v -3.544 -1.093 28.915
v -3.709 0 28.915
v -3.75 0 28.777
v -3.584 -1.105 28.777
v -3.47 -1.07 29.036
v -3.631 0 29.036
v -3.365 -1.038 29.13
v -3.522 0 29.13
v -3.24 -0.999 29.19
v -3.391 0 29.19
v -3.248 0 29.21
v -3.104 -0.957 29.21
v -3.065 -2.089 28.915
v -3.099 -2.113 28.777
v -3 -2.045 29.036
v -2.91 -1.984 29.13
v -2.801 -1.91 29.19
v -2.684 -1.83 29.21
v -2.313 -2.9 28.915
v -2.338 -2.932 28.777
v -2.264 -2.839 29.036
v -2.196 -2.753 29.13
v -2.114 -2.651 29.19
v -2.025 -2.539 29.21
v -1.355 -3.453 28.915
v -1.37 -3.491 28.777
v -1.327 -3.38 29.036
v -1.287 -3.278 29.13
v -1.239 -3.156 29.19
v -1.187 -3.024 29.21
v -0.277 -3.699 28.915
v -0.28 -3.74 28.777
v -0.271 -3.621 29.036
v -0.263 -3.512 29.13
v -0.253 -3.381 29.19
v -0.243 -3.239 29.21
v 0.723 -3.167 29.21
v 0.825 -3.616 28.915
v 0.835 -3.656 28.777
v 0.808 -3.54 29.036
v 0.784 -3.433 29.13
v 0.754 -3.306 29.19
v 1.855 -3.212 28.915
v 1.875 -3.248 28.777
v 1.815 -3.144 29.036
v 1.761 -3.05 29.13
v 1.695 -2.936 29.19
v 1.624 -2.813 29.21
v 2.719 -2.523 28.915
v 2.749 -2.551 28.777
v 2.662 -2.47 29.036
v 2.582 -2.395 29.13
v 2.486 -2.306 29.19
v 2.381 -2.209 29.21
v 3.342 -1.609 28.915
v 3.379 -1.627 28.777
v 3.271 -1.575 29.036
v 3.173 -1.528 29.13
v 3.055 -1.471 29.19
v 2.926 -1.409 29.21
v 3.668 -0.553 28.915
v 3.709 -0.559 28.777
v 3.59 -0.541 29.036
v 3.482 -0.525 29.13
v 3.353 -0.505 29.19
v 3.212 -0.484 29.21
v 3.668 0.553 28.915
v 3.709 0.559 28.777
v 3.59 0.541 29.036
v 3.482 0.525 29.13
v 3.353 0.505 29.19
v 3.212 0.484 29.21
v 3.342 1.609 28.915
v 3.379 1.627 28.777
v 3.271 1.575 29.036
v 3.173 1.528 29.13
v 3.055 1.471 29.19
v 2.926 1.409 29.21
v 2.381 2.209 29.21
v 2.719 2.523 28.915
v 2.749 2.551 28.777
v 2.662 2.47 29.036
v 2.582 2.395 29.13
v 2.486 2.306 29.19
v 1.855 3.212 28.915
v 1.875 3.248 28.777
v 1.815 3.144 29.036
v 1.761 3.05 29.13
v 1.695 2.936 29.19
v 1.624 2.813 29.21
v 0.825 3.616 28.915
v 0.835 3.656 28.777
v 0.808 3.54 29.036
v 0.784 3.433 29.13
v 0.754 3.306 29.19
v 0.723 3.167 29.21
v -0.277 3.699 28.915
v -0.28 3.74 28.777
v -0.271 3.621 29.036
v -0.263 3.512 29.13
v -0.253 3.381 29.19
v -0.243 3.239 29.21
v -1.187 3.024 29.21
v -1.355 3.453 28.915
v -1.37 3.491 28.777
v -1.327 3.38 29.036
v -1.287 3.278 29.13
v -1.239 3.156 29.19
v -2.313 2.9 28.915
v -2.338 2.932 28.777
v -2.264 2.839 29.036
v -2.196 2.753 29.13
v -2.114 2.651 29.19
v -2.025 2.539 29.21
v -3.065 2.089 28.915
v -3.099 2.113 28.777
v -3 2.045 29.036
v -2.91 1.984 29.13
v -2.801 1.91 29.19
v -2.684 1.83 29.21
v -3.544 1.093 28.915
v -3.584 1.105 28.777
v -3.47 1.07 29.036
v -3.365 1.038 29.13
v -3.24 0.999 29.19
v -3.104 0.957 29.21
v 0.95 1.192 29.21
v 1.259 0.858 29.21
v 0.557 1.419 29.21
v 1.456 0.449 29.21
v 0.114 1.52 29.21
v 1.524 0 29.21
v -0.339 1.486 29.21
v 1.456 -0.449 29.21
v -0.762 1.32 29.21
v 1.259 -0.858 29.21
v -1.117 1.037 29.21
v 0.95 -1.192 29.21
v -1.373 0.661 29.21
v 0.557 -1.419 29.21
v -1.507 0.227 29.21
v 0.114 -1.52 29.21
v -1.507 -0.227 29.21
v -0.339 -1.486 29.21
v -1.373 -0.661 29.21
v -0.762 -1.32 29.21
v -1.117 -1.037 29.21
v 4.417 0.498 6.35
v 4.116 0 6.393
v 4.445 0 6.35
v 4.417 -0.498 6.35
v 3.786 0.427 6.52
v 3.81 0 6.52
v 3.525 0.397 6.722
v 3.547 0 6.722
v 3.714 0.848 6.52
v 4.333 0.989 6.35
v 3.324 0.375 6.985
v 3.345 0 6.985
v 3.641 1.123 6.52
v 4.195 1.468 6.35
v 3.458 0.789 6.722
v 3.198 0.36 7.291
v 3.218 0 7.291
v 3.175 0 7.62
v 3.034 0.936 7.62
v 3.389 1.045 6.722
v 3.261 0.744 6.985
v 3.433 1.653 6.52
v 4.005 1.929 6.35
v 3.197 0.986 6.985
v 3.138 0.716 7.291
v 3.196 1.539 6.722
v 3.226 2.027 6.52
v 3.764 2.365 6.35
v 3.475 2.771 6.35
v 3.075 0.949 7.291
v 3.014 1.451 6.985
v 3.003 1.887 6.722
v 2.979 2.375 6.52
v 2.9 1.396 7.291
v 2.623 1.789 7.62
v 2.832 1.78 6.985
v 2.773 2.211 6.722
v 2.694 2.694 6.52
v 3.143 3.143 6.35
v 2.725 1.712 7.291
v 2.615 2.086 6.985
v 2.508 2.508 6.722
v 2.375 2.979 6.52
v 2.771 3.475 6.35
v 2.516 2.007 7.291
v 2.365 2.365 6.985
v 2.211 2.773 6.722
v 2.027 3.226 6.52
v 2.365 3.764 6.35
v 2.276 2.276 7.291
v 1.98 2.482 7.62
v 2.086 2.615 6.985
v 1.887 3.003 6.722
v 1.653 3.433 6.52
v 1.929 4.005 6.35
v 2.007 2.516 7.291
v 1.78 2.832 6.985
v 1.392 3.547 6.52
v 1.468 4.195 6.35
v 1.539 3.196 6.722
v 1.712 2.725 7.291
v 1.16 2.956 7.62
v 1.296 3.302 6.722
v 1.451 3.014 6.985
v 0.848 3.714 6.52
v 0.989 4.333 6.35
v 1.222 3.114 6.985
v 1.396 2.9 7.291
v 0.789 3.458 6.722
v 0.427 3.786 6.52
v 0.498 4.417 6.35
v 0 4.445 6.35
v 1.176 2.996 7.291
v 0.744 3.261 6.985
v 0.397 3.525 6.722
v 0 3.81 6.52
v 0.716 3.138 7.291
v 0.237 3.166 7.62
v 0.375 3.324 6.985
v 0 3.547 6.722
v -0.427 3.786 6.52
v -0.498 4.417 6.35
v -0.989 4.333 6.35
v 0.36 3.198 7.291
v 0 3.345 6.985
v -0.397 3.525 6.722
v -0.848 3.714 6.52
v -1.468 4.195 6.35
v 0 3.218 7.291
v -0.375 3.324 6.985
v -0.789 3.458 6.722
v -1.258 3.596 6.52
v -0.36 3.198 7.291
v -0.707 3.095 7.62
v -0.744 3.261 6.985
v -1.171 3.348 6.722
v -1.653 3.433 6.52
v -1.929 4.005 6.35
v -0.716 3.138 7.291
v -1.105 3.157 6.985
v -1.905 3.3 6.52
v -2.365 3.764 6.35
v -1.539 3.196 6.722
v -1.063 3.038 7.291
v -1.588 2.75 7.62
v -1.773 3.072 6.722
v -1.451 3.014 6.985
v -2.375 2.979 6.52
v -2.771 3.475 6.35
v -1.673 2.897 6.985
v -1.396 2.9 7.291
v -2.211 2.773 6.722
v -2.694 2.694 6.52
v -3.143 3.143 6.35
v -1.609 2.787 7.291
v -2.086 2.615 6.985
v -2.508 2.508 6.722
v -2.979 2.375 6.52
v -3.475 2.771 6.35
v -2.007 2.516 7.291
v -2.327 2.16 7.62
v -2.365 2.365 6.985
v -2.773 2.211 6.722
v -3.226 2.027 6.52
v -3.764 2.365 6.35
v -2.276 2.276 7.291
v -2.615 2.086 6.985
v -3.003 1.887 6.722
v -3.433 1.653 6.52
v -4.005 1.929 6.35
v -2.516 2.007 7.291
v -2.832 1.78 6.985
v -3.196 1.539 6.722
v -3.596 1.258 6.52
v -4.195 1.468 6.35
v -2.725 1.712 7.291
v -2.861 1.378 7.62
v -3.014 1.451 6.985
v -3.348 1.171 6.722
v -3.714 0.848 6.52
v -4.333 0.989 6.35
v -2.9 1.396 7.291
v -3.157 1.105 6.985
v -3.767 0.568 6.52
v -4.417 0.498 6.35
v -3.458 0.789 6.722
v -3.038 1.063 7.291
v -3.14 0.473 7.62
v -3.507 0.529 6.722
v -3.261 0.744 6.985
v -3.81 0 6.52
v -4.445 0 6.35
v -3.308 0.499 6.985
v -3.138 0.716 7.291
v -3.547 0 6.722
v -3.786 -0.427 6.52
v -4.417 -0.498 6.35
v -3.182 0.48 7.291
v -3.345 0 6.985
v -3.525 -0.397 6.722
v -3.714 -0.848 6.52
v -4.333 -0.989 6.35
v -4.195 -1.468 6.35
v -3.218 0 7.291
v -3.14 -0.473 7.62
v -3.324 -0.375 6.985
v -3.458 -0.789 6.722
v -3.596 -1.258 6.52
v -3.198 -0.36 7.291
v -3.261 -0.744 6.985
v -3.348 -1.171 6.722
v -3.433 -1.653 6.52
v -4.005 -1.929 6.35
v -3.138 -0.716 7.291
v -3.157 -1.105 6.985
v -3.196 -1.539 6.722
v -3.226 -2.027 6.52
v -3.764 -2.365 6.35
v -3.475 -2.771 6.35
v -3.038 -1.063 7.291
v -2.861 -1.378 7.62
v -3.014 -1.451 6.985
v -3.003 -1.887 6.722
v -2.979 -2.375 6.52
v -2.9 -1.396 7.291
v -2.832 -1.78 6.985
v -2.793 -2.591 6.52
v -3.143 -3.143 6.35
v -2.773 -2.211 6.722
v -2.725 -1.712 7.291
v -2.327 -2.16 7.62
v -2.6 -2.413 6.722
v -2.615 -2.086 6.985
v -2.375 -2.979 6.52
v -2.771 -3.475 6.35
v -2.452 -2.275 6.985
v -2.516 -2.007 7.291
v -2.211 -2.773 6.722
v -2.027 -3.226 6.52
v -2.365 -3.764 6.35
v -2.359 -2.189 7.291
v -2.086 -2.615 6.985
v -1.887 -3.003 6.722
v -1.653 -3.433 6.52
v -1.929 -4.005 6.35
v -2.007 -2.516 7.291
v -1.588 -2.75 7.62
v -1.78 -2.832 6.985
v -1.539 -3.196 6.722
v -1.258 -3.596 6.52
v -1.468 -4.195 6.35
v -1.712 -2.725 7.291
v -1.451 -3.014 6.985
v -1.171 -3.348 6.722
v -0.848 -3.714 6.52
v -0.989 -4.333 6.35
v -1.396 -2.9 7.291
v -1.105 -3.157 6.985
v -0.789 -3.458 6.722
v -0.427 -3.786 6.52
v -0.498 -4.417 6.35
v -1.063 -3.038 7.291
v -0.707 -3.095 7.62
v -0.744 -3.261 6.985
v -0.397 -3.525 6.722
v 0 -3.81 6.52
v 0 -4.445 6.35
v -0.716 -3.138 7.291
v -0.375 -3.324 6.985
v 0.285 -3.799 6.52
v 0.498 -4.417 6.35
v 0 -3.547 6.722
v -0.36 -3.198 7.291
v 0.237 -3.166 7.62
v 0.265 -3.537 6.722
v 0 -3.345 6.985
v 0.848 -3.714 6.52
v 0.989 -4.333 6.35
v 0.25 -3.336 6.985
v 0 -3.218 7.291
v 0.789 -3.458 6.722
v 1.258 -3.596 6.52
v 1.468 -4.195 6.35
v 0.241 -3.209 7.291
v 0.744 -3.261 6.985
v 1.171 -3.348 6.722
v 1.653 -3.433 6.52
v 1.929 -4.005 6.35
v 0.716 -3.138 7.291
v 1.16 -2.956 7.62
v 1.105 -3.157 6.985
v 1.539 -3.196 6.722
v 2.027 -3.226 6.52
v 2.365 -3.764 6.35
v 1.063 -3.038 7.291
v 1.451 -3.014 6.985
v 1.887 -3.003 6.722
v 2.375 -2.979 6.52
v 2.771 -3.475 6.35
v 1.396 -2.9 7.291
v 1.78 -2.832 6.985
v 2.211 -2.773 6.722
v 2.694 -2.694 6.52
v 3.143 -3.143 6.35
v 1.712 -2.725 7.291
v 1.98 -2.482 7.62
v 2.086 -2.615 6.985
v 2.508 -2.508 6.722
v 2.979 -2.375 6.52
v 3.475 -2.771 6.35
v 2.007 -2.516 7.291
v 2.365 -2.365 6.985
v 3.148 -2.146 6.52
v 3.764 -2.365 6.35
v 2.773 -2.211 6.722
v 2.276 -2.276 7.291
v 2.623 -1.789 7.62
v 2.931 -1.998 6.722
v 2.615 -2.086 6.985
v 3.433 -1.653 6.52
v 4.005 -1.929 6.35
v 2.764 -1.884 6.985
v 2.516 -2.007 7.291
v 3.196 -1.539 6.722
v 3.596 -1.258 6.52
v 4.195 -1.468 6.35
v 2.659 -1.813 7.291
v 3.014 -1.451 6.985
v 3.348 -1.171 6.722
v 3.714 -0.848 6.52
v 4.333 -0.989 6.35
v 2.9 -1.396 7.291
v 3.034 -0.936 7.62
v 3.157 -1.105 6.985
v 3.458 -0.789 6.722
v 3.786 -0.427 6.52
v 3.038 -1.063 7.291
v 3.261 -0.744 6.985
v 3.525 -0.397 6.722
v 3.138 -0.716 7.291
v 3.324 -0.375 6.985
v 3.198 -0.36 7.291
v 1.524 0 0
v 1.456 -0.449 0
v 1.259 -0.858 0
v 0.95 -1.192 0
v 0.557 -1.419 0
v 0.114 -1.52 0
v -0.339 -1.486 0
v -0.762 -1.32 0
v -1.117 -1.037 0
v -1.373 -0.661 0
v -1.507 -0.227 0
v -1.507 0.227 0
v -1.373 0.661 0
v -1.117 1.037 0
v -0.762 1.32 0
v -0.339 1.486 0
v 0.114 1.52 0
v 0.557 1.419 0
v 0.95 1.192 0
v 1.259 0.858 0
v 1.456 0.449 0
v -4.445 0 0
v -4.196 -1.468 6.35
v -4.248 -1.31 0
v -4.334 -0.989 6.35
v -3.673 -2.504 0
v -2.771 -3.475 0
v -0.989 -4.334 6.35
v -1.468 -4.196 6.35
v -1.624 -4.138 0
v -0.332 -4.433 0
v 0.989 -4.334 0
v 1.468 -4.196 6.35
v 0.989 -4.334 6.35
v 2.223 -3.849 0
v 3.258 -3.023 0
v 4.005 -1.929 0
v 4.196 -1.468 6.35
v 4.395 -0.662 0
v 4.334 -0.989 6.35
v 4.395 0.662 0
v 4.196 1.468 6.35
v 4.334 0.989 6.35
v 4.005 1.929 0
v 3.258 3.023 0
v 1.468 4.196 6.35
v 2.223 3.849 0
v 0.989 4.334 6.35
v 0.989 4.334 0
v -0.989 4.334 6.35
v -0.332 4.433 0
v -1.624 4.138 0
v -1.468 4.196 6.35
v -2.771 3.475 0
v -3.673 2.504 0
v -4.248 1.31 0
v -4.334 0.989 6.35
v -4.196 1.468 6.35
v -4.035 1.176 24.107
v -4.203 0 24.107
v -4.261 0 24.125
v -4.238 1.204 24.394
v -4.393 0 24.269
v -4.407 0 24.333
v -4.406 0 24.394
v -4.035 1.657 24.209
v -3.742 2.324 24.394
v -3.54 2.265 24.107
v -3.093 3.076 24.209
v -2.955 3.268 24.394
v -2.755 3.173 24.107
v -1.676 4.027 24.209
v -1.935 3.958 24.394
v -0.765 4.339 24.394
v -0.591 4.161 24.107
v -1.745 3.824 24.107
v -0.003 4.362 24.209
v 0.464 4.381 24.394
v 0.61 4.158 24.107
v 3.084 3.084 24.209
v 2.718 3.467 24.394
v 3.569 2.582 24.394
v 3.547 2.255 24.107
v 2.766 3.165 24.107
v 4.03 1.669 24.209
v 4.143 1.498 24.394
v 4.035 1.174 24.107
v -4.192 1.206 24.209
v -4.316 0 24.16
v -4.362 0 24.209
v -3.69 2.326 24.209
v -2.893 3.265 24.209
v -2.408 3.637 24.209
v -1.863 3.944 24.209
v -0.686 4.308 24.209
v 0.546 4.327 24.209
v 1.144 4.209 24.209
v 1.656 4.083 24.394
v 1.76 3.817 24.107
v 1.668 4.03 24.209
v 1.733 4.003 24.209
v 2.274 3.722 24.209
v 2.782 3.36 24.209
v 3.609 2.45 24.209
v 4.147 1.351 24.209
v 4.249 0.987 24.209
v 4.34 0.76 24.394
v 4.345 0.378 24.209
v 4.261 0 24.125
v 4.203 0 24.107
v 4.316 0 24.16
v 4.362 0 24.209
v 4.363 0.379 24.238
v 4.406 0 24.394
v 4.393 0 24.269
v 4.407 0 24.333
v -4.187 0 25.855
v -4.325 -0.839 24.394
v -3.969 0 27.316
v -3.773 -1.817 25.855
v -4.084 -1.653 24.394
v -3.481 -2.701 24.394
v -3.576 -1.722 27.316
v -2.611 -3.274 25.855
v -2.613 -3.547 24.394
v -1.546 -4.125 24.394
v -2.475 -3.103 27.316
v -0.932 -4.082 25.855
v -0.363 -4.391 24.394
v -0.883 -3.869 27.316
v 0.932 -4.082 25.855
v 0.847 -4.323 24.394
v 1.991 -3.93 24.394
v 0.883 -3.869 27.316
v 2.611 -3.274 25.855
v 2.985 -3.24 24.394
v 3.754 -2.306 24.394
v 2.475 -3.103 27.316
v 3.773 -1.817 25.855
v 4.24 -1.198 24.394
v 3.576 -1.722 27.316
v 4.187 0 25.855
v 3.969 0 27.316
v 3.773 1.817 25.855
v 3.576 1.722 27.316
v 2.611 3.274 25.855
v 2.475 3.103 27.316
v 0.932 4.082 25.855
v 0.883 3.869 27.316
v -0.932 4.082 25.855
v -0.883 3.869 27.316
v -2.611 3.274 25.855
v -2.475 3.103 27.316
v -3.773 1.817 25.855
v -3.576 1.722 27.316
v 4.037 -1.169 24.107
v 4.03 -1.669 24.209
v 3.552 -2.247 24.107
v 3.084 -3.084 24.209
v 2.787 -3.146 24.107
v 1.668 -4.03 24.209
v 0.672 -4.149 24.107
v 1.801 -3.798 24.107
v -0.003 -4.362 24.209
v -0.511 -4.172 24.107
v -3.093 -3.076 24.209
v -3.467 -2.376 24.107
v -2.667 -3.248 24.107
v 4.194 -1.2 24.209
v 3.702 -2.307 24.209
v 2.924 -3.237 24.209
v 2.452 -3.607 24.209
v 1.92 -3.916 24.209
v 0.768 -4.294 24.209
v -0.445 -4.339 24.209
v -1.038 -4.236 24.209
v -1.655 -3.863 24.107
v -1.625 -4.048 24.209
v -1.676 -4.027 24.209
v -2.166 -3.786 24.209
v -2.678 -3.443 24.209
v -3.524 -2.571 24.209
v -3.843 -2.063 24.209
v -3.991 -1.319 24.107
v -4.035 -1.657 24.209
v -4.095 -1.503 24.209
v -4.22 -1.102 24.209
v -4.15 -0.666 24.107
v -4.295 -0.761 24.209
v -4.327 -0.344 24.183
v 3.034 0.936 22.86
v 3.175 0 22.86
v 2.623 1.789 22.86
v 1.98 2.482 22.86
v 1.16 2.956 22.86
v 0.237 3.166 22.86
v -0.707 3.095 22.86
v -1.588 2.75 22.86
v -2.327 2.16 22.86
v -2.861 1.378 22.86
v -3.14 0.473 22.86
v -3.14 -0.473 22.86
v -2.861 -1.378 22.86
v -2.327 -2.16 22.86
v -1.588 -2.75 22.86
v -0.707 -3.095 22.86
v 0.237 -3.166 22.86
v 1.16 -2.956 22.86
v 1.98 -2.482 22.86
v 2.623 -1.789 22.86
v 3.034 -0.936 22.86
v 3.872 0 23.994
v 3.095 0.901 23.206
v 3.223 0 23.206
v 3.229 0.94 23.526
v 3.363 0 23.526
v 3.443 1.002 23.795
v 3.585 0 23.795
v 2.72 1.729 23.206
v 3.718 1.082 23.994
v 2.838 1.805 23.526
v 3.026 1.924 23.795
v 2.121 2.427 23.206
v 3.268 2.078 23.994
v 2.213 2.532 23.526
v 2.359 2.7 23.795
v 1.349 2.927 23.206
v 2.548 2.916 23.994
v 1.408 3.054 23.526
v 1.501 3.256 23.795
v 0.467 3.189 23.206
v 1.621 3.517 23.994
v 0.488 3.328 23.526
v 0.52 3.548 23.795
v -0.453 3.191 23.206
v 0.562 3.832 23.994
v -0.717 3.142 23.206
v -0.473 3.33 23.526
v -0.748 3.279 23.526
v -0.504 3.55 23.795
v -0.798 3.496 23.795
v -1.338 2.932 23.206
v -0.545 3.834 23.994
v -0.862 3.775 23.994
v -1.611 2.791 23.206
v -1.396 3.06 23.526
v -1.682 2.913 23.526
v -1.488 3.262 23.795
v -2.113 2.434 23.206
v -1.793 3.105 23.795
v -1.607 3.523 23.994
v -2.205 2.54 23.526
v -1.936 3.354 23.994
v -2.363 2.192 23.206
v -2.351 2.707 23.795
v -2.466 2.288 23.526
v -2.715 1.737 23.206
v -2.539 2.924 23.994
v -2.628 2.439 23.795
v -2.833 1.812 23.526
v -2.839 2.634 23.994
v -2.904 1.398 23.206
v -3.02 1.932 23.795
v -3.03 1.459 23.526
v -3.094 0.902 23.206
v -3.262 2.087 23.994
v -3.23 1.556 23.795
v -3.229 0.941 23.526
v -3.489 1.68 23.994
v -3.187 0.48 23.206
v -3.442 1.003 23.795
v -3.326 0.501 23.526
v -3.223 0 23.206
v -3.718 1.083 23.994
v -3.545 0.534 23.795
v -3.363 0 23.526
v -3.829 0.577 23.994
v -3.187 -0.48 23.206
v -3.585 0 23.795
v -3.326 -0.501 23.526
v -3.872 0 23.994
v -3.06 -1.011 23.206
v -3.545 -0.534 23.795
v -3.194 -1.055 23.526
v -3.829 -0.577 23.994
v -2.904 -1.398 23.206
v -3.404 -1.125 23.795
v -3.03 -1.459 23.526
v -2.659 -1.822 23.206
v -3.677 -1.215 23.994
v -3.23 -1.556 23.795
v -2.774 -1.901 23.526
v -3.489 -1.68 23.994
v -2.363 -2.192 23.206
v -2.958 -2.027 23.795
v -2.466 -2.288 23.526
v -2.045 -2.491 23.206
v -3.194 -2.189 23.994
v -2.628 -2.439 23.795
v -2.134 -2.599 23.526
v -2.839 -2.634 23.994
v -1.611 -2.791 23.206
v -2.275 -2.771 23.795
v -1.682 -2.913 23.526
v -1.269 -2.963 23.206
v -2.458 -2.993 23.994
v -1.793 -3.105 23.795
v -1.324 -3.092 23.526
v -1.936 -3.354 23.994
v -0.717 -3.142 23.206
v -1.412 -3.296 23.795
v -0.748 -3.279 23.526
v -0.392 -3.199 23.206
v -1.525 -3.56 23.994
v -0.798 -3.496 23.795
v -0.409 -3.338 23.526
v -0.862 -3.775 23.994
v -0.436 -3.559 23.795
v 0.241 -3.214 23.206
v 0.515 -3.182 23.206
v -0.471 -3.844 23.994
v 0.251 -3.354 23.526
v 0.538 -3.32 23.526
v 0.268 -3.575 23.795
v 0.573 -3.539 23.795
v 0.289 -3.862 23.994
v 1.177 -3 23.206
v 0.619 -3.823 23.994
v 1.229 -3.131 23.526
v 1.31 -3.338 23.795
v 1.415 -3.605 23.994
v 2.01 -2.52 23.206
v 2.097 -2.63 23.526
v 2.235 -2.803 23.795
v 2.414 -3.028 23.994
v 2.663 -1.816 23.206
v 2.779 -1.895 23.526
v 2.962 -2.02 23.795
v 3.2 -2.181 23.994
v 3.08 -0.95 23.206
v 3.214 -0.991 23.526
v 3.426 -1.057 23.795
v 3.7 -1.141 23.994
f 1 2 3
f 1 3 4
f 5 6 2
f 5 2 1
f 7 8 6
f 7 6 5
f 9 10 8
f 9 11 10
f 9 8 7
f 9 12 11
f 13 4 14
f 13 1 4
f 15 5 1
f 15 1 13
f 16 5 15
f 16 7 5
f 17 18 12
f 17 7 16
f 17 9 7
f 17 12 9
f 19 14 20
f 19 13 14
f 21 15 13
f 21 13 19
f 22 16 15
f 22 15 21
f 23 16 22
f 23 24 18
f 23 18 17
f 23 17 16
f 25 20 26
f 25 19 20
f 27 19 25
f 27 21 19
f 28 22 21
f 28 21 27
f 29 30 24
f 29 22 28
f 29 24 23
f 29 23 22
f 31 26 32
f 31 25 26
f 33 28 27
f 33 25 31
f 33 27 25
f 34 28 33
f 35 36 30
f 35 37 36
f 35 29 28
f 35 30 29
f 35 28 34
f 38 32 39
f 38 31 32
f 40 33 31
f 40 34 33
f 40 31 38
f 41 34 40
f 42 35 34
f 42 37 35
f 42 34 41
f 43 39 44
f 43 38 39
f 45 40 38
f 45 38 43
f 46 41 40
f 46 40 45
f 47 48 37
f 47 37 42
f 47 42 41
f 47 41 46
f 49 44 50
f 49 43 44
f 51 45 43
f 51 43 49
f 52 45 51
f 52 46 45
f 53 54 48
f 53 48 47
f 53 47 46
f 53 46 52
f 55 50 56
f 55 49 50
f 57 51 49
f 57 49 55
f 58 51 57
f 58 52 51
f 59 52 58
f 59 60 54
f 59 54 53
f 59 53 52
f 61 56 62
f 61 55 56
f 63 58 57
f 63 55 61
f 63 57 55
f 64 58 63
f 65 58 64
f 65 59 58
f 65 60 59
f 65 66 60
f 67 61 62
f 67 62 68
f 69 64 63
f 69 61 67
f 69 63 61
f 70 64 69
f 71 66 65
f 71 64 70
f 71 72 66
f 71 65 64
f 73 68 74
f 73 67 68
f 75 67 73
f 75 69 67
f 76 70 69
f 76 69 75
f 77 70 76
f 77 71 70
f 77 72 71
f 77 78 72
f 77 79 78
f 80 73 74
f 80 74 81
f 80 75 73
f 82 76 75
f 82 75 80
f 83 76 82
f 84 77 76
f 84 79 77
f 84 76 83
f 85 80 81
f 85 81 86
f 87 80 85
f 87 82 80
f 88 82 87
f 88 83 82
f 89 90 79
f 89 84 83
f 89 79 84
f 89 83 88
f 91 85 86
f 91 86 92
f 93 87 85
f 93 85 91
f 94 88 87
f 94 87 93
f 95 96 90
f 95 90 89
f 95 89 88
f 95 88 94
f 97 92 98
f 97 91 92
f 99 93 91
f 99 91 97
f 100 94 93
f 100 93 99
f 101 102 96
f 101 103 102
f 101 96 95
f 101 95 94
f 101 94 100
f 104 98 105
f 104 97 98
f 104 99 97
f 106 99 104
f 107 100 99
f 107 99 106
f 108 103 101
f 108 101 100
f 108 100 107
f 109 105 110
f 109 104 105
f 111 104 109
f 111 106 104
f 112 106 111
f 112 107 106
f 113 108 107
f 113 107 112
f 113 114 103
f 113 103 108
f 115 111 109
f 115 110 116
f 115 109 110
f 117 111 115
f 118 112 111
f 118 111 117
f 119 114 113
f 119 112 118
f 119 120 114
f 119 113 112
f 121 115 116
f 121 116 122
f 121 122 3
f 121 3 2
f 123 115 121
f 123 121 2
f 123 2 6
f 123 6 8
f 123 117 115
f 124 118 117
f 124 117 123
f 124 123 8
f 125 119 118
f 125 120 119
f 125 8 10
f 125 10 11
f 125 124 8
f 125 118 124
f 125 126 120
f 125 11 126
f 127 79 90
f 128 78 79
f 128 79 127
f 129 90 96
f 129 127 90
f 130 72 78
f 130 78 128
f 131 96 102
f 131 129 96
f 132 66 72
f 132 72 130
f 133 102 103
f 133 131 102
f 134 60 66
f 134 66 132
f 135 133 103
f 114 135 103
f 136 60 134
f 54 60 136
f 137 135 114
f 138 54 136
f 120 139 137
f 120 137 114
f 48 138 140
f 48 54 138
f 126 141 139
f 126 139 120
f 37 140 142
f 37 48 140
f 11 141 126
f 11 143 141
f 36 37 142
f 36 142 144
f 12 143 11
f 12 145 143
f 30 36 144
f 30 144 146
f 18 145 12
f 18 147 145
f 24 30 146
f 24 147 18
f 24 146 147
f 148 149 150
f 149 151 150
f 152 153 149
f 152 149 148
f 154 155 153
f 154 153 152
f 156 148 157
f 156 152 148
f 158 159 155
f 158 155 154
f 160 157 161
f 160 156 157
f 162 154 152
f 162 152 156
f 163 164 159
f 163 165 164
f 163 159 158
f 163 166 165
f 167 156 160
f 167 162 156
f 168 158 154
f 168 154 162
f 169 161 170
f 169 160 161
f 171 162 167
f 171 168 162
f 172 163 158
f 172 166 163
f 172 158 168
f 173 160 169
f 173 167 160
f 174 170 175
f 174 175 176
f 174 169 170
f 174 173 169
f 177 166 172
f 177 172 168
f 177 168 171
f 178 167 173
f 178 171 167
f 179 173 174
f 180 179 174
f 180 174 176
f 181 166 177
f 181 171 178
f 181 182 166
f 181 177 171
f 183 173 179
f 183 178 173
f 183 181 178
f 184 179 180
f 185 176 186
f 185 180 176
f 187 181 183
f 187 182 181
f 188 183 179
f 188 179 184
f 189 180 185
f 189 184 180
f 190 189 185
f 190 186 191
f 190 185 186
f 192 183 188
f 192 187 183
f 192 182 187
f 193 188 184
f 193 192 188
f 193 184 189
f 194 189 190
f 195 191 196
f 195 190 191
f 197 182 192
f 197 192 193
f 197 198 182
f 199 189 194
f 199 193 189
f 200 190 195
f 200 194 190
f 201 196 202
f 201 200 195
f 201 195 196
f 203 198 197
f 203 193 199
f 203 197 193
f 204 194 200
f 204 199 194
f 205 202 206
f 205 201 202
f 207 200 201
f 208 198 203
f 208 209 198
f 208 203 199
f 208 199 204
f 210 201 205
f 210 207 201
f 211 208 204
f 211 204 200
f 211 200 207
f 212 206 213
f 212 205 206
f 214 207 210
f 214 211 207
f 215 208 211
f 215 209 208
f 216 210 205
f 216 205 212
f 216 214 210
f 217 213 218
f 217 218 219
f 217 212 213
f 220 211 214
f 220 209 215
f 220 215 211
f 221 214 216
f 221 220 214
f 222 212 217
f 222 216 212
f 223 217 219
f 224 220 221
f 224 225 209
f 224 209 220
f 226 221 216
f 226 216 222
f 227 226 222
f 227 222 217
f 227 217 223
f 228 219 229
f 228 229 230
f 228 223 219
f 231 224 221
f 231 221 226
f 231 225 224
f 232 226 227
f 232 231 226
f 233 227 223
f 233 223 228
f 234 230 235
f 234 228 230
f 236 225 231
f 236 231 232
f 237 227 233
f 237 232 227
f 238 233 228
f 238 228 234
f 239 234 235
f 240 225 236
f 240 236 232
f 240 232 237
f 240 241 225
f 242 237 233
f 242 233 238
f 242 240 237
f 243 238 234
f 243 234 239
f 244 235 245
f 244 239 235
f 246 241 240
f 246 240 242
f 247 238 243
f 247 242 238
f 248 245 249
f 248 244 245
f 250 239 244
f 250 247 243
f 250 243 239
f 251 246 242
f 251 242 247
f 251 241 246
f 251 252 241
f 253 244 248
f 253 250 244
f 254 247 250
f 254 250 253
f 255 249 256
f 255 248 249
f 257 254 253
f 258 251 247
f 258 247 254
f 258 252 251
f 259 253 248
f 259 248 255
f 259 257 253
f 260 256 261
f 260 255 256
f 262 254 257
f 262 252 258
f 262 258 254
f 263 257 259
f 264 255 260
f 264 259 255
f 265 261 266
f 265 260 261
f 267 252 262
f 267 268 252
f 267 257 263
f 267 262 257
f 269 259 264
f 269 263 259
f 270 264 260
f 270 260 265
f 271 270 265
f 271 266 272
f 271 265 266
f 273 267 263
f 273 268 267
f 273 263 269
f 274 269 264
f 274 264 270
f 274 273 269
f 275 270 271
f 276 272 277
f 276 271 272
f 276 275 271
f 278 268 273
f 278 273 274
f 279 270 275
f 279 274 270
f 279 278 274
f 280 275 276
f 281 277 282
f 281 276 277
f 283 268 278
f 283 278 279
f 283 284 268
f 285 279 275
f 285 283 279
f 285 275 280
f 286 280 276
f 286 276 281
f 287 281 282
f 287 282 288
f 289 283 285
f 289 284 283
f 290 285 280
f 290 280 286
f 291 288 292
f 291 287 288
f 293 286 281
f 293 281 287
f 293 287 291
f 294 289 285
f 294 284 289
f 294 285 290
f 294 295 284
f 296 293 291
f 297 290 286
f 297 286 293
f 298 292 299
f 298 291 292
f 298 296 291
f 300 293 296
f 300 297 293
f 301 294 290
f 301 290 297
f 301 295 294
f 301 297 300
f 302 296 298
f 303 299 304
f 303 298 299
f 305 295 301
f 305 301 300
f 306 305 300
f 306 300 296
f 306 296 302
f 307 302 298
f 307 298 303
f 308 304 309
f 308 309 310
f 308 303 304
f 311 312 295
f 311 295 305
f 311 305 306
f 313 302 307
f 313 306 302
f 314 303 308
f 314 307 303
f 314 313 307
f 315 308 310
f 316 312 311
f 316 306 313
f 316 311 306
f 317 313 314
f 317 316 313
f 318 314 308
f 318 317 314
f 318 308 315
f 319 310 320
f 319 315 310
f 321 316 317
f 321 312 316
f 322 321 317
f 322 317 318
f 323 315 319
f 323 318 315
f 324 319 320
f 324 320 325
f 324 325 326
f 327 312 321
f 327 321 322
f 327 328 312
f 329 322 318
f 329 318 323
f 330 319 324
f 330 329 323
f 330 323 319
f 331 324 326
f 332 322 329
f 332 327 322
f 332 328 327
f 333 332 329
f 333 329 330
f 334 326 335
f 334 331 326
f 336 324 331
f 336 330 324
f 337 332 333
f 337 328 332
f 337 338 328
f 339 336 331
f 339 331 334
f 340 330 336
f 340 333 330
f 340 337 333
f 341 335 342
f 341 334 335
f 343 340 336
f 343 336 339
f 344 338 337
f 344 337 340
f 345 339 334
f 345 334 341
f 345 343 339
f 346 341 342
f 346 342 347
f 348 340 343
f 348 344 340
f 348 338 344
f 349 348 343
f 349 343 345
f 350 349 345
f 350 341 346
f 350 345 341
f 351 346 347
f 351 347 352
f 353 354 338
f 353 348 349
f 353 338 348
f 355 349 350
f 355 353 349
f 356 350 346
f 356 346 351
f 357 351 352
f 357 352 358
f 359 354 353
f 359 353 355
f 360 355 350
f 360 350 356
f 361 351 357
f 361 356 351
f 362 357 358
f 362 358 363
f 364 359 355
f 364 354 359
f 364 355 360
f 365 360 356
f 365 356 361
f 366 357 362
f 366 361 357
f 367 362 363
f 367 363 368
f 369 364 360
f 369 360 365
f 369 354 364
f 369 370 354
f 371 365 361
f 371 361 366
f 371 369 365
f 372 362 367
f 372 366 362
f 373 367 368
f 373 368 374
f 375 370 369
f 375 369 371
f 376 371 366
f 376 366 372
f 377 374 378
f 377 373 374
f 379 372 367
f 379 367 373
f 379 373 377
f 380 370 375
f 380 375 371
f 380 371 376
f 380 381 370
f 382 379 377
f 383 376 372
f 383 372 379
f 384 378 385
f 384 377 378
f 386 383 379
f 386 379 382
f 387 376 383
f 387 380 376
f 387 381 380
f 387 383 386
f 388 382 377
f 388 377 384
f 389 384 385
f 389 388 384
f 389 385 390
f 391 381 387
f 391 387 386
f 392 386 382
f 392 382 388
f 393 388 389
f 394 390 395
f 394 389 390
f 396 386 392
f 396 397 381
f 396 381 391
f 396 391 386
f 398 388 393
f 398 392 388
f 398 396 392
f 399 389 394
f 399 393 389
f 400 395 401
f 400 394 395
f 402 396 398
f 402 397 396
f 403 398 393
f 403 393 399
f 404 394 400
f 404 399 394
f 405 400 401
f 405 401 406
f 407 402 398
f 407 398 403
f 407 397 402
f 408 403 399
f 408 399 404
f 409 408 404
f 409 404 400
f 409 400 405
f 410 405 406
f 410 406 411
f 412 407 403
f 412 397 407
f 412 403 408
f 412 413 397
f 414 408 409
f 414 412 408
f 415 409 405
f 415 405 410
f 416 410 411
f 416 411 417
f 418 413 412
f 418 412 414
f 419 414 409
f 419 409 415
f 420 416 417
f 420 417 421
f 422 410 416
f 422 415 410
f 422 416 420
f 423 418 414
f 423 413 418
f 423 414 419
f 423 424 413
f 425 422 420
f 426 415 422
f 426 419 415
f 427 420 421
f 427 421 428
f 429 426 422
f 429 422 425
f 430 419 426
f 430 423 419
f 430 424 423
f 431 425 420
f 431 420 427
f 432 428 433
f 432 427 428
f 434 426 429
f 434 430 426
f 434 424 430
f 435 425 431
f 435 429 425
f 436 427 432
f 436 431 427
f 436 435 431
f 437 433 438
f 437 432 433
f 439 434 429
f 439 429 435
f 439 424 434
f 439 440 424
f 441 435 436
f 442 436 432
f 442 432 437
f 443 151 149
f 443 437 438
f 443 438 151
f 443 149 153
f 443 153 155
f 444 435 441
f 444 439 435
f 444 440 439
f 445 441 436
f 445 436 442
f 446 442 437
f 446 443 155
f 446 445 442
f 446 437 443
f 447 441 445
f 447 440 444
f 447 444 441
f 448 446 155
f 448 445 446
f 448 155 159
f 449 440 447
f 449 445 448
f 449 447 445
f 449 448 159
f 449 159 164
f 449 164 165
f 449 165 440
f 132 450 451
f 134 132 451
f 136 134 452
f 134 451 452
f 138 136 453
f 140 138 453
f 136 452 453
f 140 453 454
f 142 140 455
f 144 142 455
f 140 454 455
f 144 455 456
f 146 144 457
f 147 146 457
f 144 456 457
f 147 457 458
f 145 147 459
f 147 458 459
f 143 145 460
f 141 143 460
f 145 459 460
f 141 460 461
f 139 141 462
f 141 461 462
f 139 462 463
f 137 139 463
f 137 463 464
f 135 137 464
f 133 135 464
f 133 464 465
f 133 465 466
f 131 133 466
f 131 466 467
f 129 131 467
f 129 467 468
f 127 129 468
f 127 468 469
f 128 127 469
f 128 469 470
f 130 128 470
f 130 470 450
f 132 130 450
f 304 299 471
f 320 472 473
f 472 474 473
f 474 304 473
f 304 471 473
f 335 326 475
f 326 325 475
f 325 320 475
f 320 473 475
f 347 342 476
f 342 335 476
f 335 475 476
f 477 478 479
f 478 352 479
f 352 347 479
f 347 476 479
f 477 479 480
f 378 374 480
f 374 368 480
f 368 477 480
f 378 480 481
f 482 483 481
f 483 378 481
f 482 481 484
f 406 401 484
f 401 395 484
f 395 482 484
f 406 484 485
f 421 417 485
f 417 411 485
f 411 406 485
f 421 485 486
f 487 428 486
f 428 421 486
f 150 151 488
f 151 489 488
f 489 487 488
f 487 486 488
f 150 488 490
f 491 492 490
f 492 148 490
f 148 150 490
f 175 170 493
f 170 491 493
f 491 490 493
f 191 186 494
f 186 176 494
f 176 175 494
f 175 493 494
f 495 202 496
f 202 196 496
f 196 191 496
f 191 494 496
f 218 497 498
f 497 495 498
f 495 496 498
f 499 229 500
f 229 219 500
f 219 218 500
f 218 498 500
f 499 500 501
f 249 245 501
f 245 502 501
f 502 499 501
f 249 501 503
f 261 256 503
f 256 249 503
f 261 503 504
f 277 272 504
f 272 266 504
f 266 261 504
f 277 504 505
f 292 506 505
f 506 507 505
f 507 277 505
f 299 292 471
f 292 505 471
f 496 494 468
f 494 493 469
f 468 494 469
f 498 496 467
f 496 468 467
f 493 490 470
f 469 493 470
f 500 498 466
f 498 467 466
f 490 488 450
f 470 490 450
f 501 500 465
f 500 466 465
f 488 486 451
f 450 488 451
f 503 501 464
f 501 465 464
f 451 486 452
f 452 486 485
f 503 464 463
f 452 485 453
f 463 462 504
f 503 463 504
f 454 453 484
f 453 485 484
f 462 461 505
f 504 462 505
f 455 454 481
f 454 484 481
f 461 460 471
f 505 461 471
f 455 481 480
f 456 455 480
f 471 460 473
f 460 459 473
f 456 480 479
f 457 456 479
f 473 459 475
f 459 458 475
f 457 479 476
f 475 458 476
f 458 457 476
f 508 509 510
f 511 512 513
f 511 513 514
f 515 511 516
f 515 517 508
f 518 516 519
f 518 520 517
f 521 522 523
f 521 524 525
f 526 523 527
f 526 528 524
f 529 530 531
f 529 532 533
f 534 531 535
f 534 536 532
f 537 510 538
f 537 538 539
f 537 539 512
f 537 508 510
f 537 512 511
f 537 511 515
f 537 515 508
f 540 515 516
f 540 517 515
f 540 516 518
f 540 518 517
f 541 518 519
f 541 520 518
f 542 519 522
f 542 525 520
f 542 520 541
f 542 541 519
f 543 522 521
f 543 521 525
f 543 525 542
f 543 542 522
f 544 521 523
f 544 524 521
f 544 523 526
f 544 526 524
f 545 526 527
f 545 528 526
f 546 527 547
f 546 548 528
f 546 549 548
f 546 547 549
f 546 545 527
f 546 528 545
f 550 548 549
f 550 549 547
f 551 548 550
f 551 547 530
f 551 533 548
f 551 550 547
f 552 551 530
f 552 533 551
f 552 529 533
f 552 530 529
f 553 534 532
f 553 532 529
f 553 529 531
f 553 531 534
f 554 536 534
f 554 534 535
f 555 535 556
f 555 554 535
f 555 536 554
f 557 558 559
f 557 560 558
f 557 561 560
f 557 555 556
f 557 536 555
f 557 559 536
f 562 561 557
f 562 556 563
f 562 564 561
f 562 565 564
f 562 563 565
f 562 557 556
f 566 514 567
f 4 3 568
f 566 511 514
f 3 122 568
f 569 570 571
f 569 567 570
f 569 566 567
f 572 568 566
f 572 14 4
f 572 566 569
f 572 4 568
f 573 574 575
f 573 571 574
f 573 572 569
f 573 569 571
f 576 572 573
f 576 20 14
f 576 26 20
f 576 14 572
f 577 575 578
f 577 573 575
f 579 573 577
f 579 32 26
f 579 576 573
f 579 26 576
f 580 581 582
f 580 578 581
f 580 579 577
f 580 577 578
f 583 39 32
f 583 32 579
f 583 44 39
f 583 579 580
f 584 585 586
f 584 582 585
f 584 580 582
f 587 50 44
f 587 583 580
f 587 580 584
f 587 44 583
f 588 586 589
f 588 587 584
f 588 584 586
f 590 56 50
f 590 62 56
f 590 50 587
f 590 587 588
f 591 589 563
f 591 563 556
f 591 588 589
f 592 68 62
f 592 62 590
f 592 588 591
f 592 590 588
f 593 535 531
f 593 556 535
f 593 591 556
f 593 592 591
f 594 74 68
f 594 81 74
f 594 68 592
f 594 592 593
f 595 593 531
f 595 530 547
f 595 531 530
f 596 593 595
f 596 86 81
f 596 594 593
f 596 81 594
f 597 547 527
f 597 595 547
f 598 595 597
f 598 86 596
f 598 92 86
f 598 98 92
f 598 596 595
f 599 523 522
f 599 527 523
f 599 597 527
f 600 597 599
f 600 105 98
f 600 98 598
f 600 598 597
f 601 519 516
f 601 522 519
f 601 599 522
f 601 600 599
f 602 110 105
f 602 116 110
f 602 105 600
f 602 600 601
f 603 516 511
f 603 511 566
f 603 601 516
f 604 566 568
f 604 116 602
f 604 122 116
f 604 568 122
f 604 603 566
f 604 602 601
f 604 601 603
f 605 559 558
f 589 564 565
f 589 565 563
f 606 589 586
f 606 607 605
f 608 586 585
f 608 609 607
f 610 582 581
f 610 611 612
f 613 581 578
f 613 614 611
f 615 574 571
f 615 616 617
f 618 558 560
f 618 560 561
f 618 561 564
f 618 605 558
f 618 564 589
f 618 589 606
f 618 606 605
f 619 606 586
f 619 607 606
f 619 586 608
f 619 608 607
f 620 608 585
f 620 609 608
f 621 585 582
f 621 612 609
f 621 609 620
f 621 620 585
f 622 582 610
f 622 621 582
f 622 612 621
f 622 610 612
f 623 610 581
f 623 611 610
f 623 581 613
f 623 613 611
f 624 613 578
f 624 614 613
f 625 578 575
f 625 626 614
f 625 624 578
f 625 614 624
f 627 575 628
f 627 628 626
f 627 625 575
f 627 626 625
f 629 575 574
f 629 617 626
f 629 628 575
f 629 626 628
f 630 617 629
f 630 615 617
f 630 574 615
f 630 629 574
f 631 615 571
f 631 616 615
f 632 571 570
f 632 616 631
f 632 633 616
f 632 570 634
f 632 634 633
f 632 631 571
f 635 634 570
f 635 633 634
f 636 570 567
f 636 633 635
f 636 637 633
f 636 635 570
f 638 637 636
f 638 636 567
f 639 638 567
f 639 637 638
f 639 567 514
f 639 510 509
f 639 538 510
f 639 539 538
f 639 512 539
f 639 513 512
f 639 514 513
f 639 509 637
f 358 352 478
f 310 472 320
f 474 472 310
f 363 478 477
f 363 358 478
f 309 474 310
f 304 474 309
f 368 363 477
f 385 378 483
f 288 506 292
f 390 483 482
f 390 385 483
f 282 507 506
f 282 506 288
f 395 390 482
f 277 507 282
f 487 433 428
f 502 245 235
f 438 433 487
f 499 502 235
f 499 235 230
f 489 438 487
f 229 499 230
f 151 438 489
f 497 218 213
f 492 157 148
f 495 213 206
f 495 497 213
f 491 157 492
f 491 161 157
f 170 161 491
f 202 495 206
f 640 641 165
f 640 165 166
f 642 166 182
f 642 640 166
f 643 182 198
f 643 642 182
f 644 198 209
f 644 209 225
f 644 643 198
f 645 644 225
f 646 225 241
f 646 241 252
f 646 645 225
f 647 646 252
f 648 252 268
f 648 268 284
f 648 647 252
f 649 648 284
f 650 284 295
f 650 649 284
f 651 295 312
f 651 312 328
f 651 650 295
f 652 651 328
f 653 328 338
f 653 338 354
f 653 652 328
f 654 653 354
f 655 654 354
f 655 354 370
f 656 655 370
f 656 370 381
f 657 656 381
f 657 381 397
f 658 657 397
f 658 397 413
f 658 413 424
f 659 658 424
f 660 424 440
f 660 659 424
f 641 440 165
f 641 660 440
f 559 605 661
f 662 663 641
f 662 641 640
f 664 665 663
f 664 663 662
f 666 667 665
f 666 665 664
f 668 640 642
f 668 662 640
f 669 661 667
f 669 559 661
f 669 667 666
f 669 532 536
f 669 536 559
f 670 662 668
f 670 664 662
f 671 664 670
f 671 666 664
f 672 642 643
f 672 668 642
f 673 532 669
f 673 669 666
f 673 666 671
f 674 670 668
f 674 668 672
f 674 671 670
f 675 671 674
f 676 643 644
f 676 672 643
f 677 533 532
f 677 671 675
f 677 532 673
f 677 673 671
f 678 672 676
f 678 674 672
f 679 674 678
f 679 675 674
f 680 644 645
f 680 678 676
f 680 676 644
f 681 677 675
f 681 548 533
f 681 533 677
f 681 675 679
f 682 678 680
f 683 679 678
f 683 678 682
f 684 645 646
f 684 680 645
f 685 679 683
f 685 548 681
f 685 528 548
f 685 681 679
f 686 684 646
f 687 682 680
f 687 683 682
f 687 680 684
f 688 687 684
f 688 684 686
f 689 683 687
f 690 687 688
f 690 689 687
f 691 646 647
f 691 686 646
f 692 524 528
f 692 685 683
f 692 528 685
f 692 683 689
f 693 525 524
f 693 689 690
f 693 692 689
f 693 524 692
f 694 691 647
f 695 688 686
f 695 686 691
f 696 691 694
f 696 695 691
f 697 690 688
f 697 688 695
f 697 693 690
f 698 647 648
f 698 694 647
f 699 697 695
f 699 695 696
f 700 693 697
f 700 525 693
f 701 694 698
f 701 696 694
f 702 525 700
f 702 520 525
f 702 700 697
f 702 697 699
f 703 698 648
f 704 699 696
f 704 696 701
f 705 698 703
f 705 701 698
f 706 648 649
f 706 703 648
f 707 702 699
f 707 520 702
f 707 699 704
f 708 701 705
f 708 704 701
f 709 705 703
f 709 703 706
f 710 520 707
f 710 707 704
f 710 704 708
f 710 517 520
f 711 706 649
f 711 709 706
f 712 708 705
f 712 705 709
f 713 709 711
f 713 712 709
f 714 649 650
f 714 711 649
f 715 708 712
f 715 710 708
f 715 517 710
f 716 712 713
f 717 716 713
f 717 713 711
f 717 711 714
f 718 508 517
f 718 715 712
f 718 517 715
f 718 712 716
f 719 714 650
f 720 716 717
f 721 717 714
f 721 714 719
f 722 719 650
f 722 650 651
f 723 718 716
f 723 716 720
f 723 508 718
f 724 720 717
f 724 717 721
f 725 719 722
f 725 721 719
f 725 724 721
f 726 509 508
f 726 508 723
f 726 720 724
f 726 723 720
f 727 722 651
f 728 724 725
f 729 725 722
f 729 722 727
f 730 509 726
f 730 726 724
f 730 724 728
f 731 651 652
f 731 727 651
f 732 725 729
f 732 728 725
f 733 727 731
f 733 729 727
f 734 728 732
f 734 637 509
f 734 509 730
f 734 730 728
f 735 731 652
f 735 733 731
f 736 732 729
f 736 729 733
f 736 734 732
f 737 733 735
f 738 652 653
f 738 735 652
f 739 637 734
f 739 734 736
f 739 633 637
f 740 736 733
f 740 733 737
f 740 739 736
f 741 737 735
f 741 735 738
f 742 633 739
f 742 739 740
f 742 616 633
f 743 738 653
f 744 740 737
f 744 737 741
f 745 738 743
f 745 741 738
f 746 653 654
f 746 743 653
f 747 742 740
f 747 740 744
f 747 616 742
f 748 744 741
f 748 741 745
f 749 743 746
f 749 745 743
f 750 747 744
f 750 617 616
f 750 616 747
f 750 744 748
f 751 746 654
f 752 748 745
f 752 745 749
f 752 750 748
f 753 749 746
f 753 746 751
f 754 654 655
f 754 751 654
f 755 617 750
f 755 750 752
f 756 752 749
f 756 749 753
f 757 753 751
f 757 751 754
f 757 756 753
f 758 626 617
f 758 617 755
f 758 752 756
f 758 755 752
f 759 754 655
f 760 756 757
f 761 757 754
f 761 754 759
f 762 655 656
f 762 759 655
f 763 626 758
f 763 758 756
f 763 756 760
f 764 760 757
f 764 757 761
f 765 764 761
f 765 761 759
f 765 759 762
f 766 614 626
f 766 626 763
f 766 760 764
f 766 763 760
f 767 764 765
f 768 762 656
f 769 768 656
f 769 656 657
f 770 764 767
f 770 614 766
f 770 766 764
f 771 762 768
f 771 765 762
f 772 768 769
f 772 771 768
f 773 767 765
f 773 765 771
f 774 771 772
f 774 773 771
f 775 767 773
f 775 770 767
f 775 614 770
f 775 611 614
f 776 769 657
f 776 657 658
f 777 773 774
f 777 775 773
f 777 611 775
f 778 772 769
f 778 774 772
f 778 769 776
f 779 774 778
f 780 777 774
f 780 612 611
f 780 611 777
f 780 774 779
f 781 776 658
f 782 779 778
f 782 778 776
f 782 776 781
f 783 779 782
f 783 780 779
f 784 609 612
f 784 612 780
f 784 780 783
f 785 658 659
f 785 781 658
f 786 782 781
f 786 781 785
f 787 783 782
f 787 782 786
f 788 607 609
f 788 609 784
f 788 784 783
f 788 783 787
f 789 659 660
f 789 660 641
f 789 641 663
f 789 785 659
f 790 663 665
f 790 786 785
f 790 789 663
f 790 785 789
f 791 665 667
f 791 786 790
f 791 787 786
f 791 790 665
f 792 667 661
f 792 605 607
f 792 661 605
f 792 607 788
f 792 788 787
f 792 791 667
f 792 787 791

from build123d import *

# Parameters (mm, degrees)
SKETCH1_R           = 4.445
BOSS_EXTRUDE1_DEPTH = 29.21
SKETCH2_R           = 1.524
CUT_EXTRUDE1_START  = -5.08
SKETCH3_R           = 6.35
SKETCH3_R_2         = 3.175
CUT_EXTRUDE1_DEPTH  = 17.78
FILLET1_R           = 1.27
FILLET2_R           = 1.27
CHAMFER1_SIZE       = 5.08
CHAMFER1_SIZE_2     = 0.759211087
FILLET3_R           = 0.254
FILLET4_R           = 0.508


# Some blends are built 0.0001 mm under size
with BuildPart() as part:
    # Sketch1 → Boss-Extrude1 (new body)
    with BuildSketch(Plane.XY):
        with Locations(Location((0, 0, 0), (0, 0, 180))):
            Circle(SKETCH1_R)
    extrude(amount=BOSS_EXTRUDE1_DEPTH)

    # Cut-Sweep1: sweep along a curve in space
    with BuildLine() as cut_sweep1_path:
        Line((0, 0, 29.21), (0, 0, 0))
    # Sketch2 → Cut-Sweep1 (sweep, cut)
    with BuildSketch(Plane.XY.offset(29.21)):
        Circle(SKETCH2_R)
    sweep(path=cut_sweep1_path.line, mode=Mode.SUBTRACT)

    # Sketch3 → Cut-Extrude1 (cut)
    with BuildSketch(Plane.XY.offset(29.21).offset(CUT_EXTRUDE1_START)):
        Circle(SKETCH3_R)
        Circle(SKETCH3_R_2, mode=Mode.SUBTRACT)
    extrude(amount=-CUT_EXTRUDE1_DEPTH, mode=Mode.SUBTRACT)

    # Fillet1
    fillet1_edges = [part.edges().sort_by_distance(p)[0] for p in [
        (-3.175, 0, 6.35),
    ]]
    fillet(fillet1_edges, radius=FILLET1_R - 0.0001)  # a hair under: the kernel refuses the full size

    # Fillet2
    fillet2_edges = [part.edges().sort_by_distance(p)[0] for p in [
        (-3.175, 0, 24.13),
    ]]
    fillet(fillet2_edges, radius=FILLET2_R - 0.0001)  # a hair under: the kernel refuses the full size

    # Chamfer1
    # the kernel refuses this chamfer: 5.08, 0.759211087 mm, written as the material it takes off along each edge
    with BuildSketch(Plane(origin=(0, 0, 29.21), x_dir=(-1, 0, 0), z_dir=(0, 1, 0))) as chamfer1_piece_1:
        Polygon((4.445, -CHAMFER1_SIZE), (4.445 - CHAMFER1_SIZE_2, 0), (4.445, 0), align=None)
    revolve(axis=Axis((0, 0, 29.21), (0, 0, 1)), mode=Mode.SUBTRACT)

    # Fillet3
    fillet3_edges = [part.edges().sort_by_distance(p)[0] for p in [
        (4.445, 0, 24.13),
    ]]
    fillet(fillet3_edges, radius=FILLET3_R)

    # Fillet4
    fillet4_edges = [part.edges().sort_by_distance(p)[0] for p in [
        (3.685788913, 0, 29.21),
    ]]
    fillet(fillet4_edges, radius=FILLET4_R)


solid = part.part
